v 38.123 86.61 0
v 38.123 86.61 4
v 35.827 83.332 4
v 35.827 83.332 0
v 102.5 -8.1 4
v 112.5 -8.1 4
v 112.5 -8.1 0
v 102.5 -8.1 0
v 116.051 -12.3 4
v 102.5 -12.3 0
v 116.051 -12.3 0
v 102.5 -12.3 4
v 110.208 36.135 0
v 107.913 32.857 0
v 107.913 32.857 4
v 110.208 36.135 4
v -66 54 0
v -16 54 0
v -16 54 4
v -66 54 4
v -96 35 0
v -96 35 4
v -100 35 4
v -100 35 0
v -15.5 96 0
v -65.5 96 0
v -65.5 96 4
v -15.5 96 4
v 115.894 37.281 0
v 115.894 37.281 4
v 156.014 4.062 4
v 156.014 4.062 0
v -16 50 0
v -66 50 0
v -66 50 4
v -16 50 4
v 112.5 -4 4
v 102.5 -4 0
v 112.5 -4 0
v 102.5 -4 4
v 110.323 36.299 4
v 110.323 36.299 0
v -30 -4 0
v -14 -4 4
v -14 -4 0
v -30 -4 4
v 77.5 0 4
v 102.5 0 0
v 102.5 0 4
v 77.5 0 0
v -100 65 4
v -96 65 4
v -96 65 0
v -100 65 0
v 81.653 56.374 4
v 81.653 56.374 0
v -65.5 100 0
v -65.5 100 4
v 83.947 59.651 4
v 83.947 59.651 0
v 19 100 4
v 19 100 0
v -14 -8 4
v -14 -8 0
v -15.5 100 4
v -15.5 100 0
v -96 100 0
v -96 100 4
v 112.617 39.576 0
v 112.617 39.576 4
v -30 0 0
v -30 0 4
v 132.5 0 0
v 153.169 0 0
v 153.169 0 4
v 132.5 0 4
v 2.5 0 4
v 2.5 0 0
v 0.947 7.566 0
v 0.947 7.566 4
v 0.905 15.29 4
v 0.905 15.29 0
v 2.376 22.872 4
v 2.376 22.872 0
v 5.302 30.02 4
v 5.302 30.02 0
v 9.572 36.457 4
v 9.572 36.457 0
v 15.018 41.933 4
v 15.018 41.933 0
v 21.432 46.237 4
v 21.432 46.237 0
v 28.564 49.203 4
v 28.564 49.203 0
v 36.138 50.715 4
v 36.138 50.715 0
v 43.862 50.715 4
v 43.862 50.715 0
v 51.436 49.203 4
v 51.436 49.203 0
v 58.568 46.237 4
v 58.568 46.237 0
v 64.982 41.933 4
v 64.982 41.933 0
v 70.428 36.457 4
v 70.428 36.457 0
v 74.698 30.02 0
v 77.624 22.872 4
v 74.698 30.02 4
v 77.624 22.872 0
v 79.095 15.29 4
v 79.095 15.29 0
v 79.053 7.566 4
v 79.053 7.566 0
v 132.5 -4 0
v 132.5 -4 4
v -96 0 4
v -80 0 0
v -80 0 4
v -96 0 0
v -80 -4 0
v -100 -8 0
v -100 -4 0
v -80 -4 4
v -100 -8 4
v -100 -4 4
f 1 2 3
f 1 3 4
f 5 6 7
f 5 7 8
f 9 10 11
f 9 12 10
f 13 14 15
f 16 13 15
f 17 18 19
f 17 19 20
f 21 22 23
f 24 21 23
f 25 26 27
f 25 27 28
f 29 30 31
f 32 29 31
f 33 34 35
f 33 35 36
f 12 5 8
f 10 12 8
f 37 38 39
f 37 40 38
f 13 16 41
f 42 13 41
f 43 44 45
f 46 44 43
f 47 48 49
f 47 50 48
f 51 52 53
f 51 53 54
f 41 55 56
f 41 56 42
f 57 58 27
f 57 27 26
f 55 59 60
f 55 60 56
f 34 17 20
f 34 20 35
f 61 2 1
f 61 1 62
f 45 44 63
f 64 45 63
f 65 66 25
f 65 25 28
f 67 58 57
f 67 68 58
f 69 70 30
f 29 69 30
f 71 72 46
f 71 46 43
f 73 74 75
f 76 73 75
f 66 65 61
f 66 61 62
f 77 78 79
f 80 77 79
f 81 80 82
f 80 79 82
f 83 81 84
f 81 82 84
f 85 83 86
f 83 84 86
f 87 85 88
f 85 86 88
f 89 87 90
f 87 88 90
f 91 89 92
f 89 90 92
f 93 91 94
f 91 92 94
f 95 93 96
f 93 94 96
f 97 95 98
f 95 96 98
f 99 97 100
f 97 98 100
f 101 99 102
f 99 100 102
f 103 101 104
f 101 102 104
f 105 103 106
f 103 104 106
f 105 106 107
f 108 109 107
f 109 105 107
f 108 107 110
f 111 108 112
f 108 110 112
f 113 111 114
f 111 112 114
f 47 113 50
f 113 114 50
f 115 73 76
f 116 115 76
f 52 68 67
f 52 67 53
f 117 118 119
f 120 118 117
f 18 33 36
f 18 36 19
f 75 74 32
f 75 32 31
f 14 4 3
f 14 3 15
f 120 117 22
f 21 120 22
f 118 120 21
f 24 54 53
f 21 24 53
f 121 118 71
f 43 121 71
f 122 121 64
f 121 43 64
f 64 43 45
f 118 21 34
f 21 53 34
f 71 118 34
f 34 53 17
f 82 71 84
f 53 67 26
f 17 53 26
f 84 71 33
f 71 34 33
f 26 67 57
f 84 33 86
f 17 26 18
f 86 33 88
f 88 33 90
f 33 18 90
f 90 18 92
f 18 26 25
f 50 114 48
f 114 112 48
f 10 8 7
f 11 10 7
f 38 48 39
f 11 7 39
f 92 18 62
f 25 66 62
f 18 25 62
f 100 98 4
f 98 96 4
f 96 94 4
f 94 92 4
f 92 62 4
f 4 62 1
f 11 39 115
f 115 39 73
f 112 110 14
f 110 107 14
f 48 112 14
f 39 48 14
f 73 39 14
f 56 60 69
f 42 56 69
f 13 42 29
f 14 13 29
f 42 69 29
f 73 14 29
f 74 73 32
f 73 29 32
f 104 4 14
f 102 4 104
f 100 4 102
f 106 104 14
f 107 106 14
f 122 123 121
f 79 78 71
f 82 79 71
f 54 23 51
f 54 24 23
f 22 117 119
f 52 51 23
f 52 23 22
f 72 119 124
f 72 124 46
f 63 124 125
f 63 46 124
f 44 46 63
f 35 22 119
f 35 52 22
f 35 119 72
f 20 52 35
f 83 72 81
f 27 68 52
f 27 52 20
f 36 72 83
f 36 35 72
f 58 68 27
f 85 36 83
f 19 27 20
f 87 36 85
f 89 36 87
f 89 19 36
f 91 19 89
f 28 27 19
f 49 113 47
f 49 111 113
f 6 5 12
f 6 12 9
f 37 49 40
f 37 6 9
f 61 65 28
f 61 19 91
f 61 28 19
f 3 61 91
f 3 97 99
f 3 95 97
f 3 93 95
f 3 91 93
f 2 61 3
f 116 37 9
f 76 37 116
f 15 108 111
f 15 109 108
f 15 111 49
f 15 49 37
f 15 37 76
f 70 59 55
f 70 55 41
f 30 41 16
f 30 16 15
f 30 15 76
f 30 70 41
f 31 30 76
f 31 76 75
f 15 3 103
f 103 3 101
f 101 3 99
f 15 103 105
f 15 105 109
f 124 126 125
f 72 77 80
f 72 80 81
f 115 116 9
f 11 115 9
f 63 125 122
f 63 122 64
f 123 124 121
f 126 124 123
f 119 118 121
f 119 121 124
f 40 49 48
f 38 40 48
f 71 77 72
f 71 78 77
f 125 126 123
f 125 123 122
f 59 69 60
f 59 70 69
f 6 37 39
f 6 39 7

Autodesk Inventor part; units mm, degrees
ref_plane "YZ Plane" through (0, 0, 0) normal (1, 0, 0) x (0, 1, 0)
ref_plane "XZ Plane" through (0, 0, 0) normal (0, 1, 0) x (-1, 0, 0)
ref_plane "XY Plane" through (0, 0, 0) normal (0, 0, 1) x (1, 0, 0)
sketch "Sketch1" plane through (0, 0, 0) normal (0, 0, 1) x (1, 0, 0)
  line L0 (-100, 100) -> (100, 100)
  line L1 (100, 100) -> (100, 0)
  line L2 (100, 0) -> (-100, 0)
  line L3 (-100, 0) -> (-100, 100)
  arc A0 (77.5, 0) -> (2.5, 0) centre (40, 11.6402) ccw
  point P0 (0, 0)
  point P1 (0, 100)
  point P2 (0, 0)
  dimension "d0" = 200
  dimension "d1" = 100
  dimension "d22" = 75
  dimension "d23" = 102.5
extrude "Extrusion1" add sketch "Sketch1" along normal blind 4 contours L0 L1 L2 A0 L3
sketch "Sketch2" plane through (0, 0, 4) normal (0, 0, 1) x (1, 0, 0)
  line L0 (-100, 100) -> (-100, 0) projected
  line L1 (-100, 0) -> (-96, 0)
  line L2 (-96, 0) -> (-96, 35)
  line L3 (-96, 35) -> (-100, 35)
  line L4 (-100, 35) -> (-100, 0)
  line L5 (-100, 100) -> (-96, 100)
  line L6 (-96, 100) -> (-96, 65)
  line L7 (-96, 65) -> (-100, 65)
  line L8 (-100, 65) -> (-100, 100)
  point P0 (0, 0)
  dimension "d9" = 4
  dimension "d10" = 35
  dimension "d11" = 4
  dimension "d12" = 35
extrude "Extrusion2" cut sketch "Sketch2" against normal through all
sketch "Sketch3" plane through (-24.1746, 0, 0) normal (0, -1, 0) x (1, 0, 0)
  line L0 (-71.8254, 4) -> (124.1746, 4) projected
  line L1 (-55.8254, 4) -> (-5.8254, 4)
  line L2 (-5.8254, 4) -> (-5.8254, 0)
  line L3 (-5.8254, 0) -> (-55.8254, 0)
  line L4 (-55.8254, 0) -> (-55.8254, 4)
  line L5 (-75.8254, 0) -> (-75.8254, 4) projected
  line L6 (124.1746, 0) -> (-71.8254, 0) projected
  line L7 (124.1746, 4) -> (-71.8254, 4) projected
  line L8 (124.1746, 0) -> (124.1746, 4) projected
  point P0 (24.1746, 0)
  point P1 (0, 4)
  point P2 (117.1746, 0)
  point P3 (105.1746, 4)
  point P4 (-5.8254, 4)
  dimension "d15" = 4
  dimension "d16" = 20
  dimension "d17" = 50
extrude "Extrusion3" add sketch "Sketch3" along normal blind 4 contours L0 L2 L3 L4
sketch "Sketch5" plane through (100, 0, 0) normal (1, 0, 0) x (0, 0, -1)
  line L0 (-4, 100) -> (-4, 65) projected
  line L1 (-4, 100) -> (0, 100)
  line L2 (0, 100) -> (0, 0)
  line L3 (0, 0) -> (-4, 0)
  line L4 (-4, 0) -> (-4, 100)
extrude "Extrusion5" add sketch "Sketch5" along normal blind 80
sketch "Sketch6" plane through (0, 0, 4) normal (0, 0, 1) x (1, 0, 0)
  line L0 (-96, 100) -> (180, 100) projected
  line L1 (180, 100) -> (19, 100)
  line L2 (180, 100) -> (180, 0) projected
  line L3 (180, 100) -> (180, -12.7334)
  line L4 (180, -12.7334) -> (19, 100)
  point P0 (0, 0)
  dimension "d30" = 35
  dimension "d33" = 115
extrude "Extrusion6" cut sketch "Sketch6" against normal blind 80
sketch "Sketch7" plane through (161.8148, 0, 4) normal (0.5735764, 0.819152, 0) x (0.819152, -0.5735764, 0)
  line L0 (0, 0) -> (-174.3447, 0) projected
  line L1 (-69.0666, 4) -> (-145.7265, 4) projected
  line L2 (-63, 0) -> (-113, 0)
  line L3 (-113, 0) -> (-113, 4)
  line L4 (-113, 4) -> (-63, 4)
  line L5 (-63, 4) -> (-63, 0)
  line L6 (0, 4) -> (0, 0) projected
  line L7 (-113, 0) -> (-151, 0)
  line L8 (-151, 0) -> (-151, 4)
  line L9 (-151, 4) -> (-113, 4)
  line L10 (-113, 4) -> (-113, 0)
  point P0 (-132.5509, 4)
  point P1 (-130.503, 4)
  point P2 (0, 2)
  point P3 (-63, 2)
  point P4 (-113, 0)
  point P5 (-151, 0)
  dimension "d34" = 50
  dimension "d35" = 63
  dimension "d56" = 38
extrude "Extrusion7" cut sketch "Sketch7" against normal blind 4
sketch "Sketch8" plane through (-96, 100, 4) normal (0, 1, 0) x (1, 0, 0)
  line L0 (112, 4) -> (0, 4)
  line L1 (63, 0) -> (80.5, 0)
  line L2 (30.5, 4) -> (80.5, 4)
  line L3 (80.5, 4) -> (80.5, 0)
  line L4 (80.5, 0) -> (30.5, 0)
  line L5 (30.5, 0) -> (30.5, 4)
  line L6 (0, 4) -> (0, 0)
  line L7 (0, 4) -> (0, 0) projected
  point P0 (96, 4)
  point P1 (80.5, 2)
  point P2 (30.5, 2)
  point P3 (80.5, 4)
  point P4 (0, 2)
  point P5 (0, 2)
  dimension "d38" = 50
  dimension "d42" = 30.5
extrude "Extrusion8" cut sketch "Sketch8" against normal blind 4
sketch "Sketch9" plane through (161.8148, 0, 4) normal (0.5735764, 0.819152, 0) x (0.819152, -0.5735764, 0)
  line L0 (-63, 4) -> (0, 4) projected
  line L1 (0, 0) -> (-63, 0) projected
  line L2 (0, 4) -> (-7.082, 4)
  line L3 (-7.082, 4) -> (-7.082, 0)
  line L4 (-7.082, 0) -> (0, 0)
  line L5 (0, 0) -> (0, 4)
  point P0 (-132.5509, 4)
  point P1 (-7.082, 4)
  dimension "d43" = 7.082
extrude "Extrusion9" cut sketch "Sketch9" against normal through all
sketch "Sketch10" plane through (77.5, 0, 0) normal (0, -1, 0) x (1, 0, 0)
  line L0 (30.4139, 4) -> (-41.6715, 4) projected
  line L1 (32.7082, 0) -> (78.5136, 0) projected
  line L2 (25, 4) -> (55, 4)
  line L3 (55, 4) -> (55, 0)
  line L4 (55, 0) -> (25, 0)
  line L5 (25, 0) -> (25, 4)
  line L6 (0, 0) -> (0, 4) projected
  point P0 (-77.5, 0)
  point P1 (-10.5437, 4)
  point P2 (25, 2)
  point P3 (0, 2)
  dimension "d46" = 30
  dimension "d47" = 25
extrude "Extrusion10" add sketch "Sketch10" along normal blind 4
sketch "Sketch11" plane through (0, 0, 0) normal (0, 0, -1) x (-1, 0, 0)
  line L0 (16, 54) -> (66, 54)
  line L1 (66, 54) -> (66, 50)
  line L2 (66, 50) -> (16, 50)
  line L3 (16, 50) -> (16, 54)
  line L4 (96, 0) -> (96, 35) projected
  point P0 (0, 0)
  point P1 (41, 50)
  dimension "d50" = 50
  dimension "d51" = 4
  dimension "d52" = 55
  dimension "d53" = 50
extrude "Extrusion11" cut sketch "Sketch11" against normal blind 4
sketch "Sketch15" plane through (0, 0, 4) normal (0, 0, 1) x (1, 0, 0)
  line L0 (107.9139, 32.8587) -> (35.8285, 83.3334) projected
  line L1 (107.9139, 32.8587) -> (100.9511, 37.7341)
  line L2 (110.2082, 36.1353) -> (107.9139, 32.8587) projected
  line L3 (107.9139, 32.8587) -> (112.6172, 39.5758)
  line L4 (110.2082, 36.1353) -> (113.4848, 33.841)
  line L5 (156.0136, 4.0621) -> (110.2082, 36.1353) projected
  line L6 (112.6172, 39.5758) -> (115.8939, 37.2814)
  line L7 (115.8939, 37.2814) -> (113.4848, 33.841)
  line L8 (112.6172, 39.5758) -> (83.9469, 59.6509)
  line L9 (83.9469, 59.6509) -> (81.6526, 56.3743)
  line L10 (81.6526, 56.3743) -> (110.3229, 36.2991)
  line L11 (115.8939, 37.2814) -> (156.0136, 4.0621)
  point P0 (0, 0)
  point P1 (120.2672, 29.092)
  dimension "d61" = 8.2
  dimension "d62" = 4
  dimension "d63" = 35
  dimension "d64" = 4
extrude "Extrusion12" add sketch "Sketch15" against normal blind 4
sketch "Sketch16" plane through (77.5, -4, 0) normal (0, -1, 0) x (1, 0, 0)
  line L0 (55, 0) -> (55, 4) projected
  line L1 (25, 0) -> (55, 0) projected
  line L2 (55, 4) -> (25, 4)
  line L3 (25, 4) -> (25, 0)
  line L4 (25, 0) -> (55, 0)
  line L5 (55, 0) -> (55, 4)
  point P0 (-77.5, 0)
extrude "Extrusion13" add sketch "Sketch16" along normal blind 8.3
sketch "Sketch17" plane through (0, 0, 4) normal (0, 0, 1) x (1, 0, 0)
  line L0 (77.5, 0) -> (102.5, 0) projected
  line L1 (102.5, 0) -> (102.5, -12.3) projected
  line L2 (102.5, -4) -> (112.5, -4)
  line L3 (112.5, -4) -> (112.5, -8.1)
  line L4 (112.5, -8.1) -> (102.5, -8.1)
  line L5 (102.5, -8.1) -> (102.5, -4)
  line L6 (132.5, -12.3) -> (102.5, -12.3) projected
  line L7 (117.5, -12.3) -> (132.5, -12.3)
  line L8 (132.5, -12.3) -> (132.5, 0)
  line L9 (132.5, -4) -> (116.0511, -12.3)
  point P0 (0, 0)
  dimension "d71" = 4
  dimension "d72" = 4.1
  dimension "d73" = 4.2
  dimension "d74" = 10
  dimension "d77" = 4
extrude "Extrusion14" cut sketch "Sketch17" against normal blind 8.3
sketch "Sketch21" plane through (0, 0, 4) normal (0, 0, 1) x (1, 0, 0)
  line L0 (-80, -4) -> (-100, -4)
  line L1 (-100, -4) -> (-100, -8)
  line L2 (-100, -8) -> (-80, -8)
  line L3 (-80, -8) -> (-80, -4)
  line L4 (-80, -4) -> (-30, -4)
  line L5 (-30, -4) -> (-30, -8)
  line L6 (-30, -8) -> (-80, -8)
  line L7 (-80, -8) -> (-80, -4)
  line L8 (-30, -4) -> (-30, -4)
  line L9 (-30, -8) -> (-14, -8)
  line L10 (-30, -4) -> (-14, -4)
  line L11 (-14, -4) -> (-14, -8)
  line L12 (-14, -8) -> (-30, -8)
  line L13 (-30, -8) -> (-30, -4)
  point P0 (0, 0)
  dimension "d80" = 20
  dimension "d81" = 4
  dimension "d82" = 50
  dimension "d85" = 16
extrude "Extrusion15" add sketch "Sketch21" against normal blind 4
properties part number "Tapa lateral 1"
